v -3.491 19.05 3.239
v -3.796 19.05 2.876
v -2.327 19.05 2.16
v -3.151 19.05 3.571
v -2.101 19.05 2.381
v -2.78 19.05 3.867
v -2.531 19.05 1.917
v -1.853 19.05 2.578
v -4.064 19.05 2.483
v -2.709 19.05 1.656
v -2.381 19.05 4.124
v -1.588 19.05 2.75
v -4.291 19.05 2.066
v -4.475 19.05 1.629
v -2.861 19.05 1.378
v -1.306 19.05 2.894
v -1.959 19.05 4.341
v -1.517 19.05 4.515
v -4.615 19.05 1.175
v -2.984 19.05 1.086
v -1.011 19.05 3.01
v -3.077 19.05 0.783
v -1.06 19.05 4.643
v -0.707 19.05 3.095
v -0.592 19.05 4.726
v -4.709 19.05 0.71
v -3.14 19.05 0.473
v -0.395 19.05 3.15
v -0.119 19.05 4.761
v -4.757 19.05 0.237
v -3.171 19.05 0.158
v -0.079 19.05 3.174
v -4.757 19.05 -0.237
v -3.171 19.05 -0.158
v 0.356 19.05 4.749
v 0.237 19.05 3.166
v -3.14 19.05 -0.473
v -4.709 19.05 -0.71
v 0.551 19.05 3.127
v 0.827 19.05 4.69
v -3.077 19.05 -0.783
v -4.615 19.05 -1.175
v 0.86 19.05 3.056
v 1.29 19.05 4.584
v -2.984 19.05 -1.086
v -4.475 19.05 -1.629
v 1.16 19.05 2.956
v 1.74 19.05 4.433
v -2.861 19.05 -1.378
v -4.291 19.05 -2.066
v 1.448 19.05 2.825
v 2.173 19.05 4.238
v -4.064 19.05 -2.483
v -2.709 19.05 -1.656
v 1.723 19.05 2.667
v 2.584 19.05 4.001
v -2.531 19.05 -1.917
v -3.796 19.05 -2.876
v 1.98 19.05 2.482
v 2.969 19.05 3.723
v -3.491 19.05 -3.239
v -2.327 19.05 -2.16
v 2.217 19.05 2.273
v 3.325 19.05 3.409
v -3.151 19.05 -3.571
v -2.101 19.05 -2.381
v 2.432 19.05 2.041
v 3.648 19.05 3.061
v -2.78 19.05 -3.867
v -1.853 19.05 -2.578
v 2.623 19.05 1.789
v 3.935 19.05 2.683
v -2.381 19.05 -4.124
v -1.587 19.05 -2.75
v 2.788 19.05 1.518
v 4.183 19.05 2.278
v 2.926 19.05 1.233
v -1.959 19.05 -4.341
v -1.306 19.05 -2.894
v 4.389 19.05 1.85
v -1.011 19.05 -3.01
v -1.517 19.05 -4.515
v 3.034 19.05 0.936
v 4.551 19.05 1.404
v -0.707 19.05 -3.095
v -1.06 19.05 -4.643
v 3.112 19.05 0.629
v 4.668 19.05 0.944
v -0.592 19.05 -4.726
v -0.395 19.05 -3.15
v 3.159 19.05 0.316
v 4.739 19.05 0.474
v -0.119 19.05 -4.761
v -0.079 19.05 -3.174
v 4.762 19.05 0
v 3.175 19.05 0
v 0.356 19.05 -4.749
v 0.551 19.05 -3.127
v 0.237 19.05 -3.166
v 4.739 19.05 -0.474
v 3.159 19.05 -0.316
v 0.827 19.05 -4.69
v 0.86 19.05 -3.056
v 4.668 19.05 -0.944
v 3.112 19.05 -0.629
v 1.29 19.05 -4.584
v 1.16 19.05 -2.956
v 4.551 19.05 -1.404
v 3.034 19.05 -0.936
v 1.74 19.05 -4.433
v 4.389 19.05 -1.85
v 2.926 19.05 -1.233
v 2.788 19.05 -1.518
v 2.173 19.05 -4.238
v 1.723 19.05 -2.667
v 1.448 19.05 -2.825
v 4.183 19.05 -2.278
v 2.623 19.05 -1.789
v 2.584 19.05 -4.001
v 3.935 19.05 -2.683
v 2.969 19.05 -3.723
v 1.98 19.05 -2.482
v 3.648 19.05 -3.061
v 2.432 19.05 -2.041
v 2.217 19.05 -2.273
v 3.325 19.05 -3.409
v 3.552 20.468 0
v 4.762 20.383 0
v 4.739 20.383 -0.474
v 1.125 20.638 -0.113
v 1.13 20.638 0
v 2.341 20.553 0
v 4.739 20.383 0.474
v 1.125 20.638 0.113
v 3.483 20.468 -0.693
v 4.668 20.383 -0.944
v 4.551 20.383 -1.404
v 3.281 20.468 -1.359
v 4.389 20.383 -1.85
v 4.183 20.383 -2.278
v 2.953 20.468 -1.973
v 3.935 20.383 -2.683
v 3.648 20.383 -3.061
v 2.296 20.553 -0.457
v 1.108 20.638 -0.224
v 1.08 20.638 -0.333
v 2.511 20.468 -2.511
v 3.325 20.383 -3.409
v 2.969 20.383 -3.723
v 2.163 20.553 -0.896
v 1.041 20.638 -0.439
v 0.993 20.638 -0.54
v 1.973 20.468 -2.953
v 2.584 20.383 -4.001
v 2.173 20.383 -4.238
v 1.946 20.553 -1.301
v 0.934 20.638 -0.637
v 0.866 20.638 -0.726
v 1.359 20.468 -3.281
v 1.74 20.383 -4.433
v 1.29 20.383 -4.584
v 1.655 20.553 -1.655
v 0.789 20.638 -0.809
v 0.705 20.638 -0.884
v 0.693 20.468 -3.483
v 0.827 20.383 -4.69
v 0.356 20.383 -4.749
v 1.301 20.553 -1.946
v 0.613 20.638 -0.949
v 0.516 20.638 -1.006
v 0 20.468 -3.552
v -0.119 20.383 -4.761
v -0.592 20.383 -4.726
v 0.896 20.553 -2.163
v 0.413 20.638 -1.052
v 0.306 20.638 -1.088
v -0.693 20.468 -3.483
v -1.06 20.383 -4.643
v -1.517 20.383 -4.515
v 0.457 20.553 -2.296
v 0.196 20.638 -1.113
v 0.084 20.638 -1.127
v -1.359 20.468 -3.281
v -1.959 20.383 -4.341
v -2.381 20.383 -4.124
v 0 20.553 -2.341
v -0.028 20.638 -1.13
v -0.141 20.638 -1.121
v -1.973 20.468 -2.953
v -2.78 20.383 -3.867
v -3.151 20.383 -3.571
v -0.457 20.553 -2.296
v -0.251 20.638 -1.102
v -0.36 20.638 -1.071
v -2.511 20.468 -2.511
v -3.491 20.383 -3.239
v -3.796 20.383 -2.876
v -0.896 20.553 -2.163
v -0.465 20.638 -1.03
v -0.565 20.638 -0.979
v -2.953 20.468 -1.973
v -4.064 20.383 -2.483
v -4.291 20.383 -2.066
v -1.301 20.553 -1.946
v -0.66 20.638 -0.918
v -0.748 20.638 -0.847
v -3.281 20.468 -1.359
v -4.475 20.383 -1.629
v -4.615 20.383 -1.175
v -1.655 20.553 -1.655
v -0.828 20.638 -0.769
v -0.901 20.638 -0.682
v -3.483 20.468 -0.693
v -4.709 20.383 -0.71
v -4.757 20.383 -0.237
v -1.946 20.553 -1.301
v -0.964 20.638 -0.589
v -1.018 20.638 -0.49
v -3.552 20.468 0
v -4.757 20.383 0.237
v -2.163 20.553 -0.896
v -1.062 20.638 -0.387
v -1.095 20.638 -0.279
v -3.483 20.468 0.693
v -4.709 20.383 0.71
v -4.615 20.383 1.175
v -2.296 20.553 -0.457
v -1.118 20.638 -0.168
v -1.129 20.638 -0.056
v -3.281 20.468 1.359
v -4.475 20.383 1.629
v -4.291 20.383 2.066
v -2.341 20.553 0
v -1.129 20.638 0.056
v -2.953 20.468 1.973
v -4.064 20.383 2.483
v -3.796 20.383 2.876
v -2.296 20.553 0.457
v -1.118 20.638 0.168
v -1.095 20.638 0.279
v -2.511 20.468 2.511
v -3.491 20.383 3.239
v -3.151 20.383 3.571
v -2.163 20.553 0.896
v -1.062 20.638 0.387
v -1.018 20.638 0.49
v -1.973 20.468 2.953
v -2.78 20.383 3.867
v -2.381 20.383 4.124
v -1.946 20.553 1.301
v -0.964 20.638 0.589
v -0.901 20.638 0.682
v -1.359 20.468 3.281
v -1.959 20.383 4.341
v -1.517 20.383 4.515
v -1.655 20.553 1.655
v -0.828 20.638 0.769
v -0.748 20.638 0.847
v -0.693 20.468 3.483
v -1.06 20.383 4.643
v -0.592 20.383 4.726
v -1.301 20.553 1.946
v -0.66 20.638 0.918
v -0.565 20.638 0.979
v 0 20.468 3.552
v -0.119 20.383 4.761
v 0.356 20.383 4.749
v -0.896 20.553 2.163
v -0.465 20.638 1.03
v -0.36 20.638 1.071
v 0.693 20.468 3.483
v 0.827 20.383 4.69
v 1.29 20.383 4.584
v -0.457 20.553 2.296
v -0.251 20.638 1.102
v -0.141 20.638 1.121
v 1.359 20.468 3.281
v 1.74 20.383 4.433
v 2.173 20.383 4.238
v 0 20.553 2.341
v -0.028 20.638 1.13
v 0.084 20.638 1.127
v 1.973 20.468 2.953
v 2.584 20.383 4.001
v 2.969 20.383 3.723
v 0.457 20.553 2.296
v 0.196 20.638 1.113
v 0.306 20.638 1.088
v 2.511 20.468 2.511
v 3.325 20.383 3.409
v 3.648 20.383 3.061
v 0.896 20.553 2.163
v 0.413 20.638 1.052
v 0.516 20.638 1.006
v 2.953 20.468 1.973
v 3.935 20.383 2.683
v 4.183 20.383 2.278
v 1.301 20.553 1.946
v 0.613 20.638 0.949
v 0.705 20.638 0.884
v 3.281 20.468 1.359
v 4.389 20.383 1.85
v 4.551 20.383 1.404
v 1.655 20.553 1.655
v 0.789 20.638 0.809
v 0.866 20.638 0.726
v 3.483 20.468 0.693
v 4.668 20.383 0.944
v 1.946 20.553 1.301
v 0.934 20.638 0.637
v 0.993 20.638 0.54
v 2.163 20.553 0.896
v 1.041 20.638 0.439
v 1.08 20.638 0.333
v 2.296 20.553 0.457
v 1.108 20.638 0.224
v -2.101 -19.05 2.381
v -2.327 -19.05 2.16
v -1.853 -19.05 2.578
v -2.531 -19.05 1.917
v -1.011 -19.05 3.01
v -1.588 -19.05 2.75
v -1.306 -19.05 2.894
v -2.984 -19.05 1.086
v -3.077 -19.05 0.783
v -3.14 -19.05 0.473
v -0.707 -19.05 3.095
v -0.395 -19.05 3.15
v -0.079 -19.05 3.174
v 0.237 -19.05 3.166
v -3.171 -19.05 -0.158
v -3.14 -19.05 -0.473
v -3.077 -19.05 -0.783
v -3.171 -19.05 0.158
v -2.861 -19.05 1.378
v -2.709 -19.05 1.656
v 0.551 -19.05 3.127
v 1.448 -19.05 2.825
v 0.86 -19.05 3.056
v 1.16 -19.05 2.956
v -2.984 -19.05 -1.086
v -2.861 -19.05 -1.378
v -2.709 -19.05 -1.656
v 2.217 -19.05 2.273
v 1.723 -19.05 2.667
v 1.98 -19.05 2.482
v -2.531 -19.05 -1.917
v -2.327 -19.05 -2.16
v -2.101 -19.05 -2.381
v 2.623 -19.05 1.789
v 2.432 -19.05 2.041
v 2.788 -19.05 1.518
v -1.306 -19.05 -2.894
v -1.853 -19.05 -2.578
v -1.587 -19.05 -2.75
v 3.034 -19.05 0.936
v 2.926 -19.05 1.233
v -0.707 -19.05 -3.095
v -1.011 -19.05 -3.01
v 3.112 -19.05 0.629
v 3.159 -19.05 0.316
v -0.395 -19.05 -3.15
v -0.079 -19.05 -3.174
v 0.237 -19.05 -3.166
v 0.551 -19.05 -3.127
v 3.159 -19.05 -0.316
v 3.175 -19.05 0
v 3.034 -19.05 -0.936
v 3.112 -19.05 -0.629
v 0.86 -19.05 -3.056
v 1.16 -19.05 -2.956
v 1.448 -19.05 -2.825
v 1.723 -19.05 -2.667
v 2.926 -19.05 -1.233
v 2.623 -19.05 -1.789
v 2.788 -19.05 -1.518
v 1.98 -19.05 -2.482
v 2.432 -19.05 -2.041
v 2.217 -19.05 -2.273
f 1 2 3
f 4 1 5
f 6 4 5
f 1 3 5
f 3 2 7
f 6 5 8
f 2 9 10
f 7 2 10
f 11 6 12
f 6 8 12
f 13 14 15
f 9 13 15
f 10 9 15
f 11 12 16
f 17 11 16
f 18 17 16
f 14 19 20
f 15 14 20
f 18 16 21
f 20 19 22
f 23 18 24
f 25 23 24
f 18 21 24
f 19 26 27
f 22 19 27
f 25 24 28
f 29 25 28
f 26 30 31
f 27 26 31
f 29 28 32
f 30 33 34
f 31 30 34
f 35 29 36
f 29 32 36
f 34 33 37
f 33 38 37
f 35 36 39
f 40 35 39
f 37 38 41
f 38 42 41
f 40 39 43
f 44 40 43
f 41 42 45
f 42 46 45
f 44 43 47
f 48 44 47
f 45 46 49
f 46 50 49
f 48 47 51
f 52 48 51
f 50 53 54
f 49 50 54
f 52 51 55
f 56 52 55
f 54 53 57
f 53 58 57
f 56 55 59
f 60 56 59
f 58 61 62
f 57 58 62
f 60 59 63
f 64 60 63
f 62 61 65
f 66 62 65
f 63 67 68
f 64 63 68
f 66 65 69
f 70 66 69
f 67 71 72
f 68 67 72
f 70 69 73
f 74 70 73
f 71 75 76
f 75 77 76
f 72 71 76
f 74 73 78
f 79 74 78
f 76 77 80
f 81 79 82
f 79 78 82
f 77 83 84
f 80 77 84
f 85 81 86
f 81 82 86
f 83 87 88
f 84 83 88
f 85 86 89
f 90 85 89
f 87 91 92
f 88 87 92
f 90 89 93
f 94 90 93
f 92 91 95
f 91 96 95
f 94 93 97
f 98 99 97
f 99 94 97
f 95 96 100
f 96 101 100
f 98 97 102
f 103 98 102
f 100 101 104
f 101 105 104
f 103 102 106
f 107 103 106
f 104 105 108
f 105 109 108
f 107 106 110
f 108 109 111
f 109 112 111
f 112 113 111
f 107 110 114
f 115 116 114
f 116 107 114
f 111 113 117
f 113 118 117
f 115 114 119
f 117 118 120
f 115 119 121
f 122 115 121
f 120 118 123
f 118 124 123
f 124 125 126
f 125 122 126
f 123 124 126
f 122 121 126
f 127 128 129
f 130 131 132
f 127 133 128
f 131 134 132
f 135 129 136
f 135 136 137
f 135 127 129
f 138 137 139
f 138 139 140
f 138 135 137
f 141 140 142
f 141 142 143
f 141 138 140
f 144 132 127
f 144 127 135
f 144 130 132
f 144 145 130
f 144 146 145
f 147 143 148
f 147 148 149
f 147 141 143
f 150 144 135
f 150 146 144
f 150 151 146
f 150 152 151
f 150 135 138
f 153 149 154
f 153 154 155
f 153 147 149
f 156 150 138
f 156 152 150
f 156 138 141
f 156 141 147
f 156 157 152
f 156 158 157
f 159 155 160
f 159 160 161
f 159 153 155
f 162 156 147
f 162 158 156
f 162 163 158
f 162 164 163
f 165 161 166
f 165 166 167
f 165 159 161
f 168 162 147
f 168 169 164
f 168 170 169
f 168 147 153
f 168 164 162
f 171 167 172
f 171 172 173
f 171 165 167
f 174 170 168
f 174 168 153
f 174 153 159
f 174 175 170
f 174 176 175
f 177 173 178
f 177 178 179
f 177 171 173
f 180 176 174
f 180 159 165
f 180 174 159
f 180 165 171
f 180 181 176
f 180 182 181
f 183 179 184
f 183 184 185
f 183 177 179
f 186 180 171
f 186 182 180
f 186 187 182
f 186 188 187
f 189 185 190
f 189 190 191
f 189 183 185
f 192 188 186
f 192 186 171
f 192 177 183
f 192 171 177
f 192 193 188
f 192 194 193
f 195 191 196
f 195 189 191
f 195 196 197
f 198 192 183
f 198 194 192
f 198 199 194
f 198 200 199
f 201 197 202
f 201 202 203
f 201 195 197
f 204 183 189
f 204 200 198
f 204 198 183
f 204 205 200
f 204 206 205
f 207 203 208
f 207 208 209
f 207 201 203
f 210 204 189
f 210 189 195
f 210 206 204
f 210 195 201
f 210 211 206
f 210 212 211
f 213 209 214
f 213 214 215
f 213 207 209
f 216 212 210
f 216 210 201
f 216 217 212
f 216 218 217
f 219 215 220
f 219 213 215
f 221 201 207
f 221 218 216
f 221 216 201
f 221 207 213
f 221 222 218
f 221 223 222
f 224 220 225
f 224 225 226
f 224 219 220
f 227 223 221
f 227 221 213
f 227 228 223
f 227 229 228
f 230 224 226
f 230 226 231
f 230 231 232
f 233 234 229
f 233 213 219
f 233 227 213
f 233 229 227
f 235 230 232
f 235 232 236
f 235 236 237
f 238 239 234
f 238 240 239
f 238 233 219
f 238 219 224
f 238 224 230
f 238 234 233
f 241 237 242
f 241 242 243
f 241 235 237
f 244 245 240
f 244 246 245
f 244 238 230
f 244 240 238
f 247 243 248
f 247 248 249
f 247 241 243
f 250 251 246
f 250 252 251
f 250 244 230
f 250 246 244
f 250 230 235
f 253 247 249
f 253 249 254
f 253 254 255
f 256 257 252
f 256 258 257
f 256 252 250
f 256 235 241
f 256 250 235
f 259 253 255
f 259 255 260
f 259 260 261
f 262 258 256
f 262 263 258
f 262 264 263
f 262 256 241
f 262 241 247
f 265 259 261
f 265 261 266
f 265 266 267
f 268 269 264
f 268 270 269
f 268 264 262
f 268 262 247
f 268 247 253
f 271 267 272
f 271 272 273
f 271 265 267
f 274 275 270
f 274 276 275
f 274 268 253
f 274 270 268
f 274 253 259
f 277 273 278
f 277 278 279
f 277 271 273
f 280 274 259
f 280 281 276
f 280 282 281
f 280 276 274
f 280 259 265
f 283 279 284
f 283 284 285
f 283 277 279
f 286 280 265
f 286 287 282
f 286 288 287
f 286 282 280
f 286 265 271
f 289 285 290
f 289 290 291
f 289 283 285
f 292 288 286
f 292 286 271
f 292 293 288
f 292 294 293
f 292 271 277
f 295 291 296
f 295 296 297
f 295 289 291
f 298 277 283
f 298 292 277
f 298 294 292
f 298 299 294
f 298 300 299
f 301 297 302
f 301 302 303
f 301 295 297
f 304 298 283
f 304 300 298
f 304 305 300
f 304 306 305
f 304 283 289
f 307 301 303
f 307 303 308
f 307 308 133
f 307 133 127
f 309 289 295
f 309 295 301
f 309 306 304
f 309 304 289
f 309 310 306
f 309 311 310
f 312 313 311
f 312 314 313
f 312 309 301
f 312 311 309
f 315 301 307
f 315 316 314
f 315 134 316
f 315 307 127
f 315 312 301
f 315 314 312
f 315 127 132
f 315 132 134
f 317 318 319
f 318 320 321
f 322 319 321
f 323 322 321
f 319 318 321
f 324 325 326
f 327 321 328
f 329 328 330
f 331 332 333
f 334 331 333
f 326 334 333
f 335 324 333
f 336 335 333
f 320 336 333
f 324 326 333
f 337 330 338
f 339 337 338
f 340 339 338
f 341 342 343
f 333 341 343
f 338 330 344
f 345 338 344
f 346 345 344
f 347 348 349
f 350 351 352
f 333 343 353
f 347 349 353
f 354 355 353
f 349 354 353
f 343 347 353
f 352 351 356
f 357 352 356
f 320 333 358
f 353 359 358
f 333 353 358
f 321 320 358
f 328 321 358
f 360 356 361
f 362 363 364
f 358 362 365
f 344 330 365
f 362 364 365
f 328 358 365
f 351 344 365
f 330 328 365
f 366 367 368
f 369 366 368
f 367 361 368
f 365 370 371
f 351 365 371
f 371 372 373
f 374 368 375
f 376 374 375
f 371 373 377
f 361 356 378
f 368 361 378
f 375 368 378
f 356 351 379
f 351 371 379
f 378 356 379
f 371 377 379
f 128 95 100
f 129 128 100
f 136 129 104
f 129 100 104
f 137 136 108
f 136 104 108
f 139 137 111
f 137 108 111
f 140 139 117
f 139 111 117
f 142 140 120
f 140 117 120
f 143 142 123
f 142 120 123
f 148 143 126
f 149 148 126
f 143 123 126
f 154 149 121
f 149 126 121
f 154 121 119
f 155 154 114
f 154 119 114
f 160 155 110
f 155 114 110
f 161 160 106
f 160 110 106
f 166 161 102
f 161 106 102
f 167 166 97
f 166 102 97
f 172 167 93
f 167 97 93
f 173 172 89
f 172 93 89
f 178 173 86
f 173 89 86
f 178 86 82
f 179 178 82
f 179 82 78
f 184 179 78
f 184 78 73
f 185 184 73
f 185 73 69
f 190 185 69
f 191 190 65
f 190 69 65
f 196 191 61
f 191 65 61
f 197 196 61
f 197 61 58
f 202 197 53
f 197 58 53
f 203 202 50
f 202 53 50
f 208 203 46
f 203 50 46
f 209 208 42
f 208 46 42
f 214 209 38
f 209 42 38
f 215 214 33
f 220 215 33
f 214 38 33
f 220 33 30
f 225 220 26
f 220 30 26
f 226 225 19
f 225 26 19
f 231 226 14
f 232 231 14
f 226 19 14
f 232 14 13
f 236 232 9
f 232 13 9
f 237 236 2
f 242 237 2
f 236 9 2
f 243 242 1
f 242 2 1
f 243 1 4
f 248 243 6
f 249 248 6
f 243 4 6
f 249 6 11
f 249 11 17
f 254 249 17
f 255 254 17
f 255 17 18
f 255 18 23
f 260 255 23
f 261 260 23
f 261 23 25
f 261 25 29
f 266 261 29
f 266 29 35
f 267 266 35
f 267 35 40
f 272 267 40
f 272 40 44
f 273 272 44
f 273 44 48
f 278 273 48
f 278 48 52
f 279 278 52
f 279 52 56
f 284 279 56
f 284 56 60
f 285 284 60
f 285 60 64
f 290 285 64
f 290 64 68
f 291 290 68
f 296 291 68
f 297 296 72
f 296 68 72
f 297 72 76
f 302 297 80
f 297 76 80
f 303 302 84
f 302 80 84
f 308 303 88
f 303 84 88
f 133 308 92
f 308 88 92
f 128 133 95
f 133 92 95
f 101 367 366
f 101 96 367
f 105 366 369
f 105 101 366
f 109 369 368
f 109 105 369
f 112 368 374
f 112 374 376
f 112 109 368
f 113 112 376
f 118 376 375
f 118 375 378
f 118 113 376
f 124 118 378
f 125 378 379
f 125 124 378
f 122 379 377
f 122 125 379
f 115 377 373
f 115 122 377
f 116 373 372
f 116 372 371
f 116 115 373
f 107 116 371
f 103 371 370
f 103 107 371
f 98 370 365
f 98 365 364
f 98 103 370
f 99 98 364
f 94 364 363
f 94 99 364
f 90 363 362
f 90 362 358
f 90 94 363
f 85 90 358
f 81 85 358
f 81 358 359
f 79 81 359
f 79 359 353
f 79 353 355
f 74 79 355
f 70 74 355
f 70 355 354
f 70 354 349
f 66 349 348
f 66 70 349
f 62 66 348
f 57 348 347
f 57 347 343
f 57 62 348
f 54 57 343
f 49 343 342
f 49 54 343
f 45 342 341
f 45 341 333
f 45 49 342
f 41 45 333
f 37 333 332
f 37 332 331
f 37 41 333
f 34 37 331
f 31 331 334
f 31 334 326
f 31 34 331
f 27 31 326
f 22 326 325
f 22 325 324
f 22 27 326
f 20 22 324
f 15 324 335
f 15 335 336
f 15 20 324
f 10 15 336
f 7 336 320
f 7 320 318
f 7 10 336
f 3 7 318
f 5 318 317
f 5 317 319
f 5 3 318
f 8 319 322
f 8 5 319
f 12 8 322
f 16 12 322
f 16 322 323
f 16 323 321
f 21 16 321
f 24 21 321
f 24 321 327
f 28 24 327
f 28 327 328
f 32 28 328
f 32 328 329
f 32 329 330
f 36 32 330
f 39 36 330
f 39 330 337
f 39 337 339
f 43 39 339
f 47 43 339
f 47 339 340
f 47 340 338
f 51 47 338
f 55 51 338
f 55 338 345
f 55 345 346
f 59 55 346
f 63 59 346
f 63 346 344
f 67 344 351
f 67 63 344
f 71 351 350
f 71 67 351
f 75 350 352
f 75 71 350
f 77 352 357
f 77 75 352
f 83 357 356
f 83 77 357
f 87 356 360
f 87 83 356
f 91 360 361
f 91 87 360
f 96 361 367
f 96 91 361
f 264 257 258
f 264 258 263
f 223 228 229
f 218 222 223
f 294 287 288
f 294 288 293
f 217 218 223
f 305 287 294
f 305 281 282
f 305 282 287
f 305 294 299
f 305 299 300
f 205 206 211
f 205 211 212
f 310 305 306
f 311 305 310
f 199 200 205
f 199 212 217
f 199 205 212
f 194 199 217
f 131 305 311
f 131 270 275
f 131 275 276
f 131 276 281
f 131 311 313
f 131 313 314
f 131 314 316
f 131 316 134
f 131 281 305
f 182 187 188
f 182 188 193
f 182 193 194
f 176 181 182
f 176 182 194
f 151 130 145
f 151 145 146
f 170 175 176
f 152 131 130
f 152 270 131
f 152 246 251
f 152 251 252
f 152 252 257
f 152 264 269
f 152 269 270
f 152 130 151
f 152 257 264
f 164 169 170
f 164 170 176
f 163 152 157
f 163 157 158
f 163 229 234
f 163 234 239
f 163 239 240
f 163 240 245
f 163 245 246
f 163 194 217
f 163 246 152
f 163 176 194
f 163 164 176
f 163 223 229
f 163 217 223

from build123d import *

# Parameters (mm, degrees)
SKETCH1_R           = 3.175
BOSS_EXTRUDE1_DEPTH = 19.05
SKETCH2_R           = 4.7625
BOSS_EXTRUDE2_DEPTH = 1.5875
CHAMFER1_SIZE       = 0.254
CHAMFER1_SIZE2      = 3.632369229


with BuildPart() as part:
    # Sketch1 → Boss-Extrude1 (new body, symmetric)
    with BuildSketch(Plane(origin=(0, 0, 0), x_dir=(1, 0, 0), z_dir=(0, 1, 0))):
        Circle(SKETCH1_R)
    extrude(amount=BOSS_EXTRUDE1_DEPTH, both=True)

    # Sketch2 → Boss-Extrude2 (add)
    with BuildSketch(Plane(origin=(0, 19.05, 0), x_dir=(1, 0, 0), z_dir=(0, 1, 0))):
        Circle(SKETCH2_R)
    extrude(amount=BOSS_EXTRUDE2_DEPTH)

    # Chamfer1
    chamfer1_edges = [part.edges().sort_by_distance(p)[0] for p in [
        (-4.7625, 20.6375, 0),
    ]]
    chamfer1_side = [part.faces().sort_by_distance(p)[0] for p in [
        (-4.7625, 19.84375, 0),
    ]]
    chamfer(chamfer1_edges, length=CHAMFER1_SIZE, length2=CHAMFER1_SIZE2, reference=chamfer1_side[0])


solid = part.part
